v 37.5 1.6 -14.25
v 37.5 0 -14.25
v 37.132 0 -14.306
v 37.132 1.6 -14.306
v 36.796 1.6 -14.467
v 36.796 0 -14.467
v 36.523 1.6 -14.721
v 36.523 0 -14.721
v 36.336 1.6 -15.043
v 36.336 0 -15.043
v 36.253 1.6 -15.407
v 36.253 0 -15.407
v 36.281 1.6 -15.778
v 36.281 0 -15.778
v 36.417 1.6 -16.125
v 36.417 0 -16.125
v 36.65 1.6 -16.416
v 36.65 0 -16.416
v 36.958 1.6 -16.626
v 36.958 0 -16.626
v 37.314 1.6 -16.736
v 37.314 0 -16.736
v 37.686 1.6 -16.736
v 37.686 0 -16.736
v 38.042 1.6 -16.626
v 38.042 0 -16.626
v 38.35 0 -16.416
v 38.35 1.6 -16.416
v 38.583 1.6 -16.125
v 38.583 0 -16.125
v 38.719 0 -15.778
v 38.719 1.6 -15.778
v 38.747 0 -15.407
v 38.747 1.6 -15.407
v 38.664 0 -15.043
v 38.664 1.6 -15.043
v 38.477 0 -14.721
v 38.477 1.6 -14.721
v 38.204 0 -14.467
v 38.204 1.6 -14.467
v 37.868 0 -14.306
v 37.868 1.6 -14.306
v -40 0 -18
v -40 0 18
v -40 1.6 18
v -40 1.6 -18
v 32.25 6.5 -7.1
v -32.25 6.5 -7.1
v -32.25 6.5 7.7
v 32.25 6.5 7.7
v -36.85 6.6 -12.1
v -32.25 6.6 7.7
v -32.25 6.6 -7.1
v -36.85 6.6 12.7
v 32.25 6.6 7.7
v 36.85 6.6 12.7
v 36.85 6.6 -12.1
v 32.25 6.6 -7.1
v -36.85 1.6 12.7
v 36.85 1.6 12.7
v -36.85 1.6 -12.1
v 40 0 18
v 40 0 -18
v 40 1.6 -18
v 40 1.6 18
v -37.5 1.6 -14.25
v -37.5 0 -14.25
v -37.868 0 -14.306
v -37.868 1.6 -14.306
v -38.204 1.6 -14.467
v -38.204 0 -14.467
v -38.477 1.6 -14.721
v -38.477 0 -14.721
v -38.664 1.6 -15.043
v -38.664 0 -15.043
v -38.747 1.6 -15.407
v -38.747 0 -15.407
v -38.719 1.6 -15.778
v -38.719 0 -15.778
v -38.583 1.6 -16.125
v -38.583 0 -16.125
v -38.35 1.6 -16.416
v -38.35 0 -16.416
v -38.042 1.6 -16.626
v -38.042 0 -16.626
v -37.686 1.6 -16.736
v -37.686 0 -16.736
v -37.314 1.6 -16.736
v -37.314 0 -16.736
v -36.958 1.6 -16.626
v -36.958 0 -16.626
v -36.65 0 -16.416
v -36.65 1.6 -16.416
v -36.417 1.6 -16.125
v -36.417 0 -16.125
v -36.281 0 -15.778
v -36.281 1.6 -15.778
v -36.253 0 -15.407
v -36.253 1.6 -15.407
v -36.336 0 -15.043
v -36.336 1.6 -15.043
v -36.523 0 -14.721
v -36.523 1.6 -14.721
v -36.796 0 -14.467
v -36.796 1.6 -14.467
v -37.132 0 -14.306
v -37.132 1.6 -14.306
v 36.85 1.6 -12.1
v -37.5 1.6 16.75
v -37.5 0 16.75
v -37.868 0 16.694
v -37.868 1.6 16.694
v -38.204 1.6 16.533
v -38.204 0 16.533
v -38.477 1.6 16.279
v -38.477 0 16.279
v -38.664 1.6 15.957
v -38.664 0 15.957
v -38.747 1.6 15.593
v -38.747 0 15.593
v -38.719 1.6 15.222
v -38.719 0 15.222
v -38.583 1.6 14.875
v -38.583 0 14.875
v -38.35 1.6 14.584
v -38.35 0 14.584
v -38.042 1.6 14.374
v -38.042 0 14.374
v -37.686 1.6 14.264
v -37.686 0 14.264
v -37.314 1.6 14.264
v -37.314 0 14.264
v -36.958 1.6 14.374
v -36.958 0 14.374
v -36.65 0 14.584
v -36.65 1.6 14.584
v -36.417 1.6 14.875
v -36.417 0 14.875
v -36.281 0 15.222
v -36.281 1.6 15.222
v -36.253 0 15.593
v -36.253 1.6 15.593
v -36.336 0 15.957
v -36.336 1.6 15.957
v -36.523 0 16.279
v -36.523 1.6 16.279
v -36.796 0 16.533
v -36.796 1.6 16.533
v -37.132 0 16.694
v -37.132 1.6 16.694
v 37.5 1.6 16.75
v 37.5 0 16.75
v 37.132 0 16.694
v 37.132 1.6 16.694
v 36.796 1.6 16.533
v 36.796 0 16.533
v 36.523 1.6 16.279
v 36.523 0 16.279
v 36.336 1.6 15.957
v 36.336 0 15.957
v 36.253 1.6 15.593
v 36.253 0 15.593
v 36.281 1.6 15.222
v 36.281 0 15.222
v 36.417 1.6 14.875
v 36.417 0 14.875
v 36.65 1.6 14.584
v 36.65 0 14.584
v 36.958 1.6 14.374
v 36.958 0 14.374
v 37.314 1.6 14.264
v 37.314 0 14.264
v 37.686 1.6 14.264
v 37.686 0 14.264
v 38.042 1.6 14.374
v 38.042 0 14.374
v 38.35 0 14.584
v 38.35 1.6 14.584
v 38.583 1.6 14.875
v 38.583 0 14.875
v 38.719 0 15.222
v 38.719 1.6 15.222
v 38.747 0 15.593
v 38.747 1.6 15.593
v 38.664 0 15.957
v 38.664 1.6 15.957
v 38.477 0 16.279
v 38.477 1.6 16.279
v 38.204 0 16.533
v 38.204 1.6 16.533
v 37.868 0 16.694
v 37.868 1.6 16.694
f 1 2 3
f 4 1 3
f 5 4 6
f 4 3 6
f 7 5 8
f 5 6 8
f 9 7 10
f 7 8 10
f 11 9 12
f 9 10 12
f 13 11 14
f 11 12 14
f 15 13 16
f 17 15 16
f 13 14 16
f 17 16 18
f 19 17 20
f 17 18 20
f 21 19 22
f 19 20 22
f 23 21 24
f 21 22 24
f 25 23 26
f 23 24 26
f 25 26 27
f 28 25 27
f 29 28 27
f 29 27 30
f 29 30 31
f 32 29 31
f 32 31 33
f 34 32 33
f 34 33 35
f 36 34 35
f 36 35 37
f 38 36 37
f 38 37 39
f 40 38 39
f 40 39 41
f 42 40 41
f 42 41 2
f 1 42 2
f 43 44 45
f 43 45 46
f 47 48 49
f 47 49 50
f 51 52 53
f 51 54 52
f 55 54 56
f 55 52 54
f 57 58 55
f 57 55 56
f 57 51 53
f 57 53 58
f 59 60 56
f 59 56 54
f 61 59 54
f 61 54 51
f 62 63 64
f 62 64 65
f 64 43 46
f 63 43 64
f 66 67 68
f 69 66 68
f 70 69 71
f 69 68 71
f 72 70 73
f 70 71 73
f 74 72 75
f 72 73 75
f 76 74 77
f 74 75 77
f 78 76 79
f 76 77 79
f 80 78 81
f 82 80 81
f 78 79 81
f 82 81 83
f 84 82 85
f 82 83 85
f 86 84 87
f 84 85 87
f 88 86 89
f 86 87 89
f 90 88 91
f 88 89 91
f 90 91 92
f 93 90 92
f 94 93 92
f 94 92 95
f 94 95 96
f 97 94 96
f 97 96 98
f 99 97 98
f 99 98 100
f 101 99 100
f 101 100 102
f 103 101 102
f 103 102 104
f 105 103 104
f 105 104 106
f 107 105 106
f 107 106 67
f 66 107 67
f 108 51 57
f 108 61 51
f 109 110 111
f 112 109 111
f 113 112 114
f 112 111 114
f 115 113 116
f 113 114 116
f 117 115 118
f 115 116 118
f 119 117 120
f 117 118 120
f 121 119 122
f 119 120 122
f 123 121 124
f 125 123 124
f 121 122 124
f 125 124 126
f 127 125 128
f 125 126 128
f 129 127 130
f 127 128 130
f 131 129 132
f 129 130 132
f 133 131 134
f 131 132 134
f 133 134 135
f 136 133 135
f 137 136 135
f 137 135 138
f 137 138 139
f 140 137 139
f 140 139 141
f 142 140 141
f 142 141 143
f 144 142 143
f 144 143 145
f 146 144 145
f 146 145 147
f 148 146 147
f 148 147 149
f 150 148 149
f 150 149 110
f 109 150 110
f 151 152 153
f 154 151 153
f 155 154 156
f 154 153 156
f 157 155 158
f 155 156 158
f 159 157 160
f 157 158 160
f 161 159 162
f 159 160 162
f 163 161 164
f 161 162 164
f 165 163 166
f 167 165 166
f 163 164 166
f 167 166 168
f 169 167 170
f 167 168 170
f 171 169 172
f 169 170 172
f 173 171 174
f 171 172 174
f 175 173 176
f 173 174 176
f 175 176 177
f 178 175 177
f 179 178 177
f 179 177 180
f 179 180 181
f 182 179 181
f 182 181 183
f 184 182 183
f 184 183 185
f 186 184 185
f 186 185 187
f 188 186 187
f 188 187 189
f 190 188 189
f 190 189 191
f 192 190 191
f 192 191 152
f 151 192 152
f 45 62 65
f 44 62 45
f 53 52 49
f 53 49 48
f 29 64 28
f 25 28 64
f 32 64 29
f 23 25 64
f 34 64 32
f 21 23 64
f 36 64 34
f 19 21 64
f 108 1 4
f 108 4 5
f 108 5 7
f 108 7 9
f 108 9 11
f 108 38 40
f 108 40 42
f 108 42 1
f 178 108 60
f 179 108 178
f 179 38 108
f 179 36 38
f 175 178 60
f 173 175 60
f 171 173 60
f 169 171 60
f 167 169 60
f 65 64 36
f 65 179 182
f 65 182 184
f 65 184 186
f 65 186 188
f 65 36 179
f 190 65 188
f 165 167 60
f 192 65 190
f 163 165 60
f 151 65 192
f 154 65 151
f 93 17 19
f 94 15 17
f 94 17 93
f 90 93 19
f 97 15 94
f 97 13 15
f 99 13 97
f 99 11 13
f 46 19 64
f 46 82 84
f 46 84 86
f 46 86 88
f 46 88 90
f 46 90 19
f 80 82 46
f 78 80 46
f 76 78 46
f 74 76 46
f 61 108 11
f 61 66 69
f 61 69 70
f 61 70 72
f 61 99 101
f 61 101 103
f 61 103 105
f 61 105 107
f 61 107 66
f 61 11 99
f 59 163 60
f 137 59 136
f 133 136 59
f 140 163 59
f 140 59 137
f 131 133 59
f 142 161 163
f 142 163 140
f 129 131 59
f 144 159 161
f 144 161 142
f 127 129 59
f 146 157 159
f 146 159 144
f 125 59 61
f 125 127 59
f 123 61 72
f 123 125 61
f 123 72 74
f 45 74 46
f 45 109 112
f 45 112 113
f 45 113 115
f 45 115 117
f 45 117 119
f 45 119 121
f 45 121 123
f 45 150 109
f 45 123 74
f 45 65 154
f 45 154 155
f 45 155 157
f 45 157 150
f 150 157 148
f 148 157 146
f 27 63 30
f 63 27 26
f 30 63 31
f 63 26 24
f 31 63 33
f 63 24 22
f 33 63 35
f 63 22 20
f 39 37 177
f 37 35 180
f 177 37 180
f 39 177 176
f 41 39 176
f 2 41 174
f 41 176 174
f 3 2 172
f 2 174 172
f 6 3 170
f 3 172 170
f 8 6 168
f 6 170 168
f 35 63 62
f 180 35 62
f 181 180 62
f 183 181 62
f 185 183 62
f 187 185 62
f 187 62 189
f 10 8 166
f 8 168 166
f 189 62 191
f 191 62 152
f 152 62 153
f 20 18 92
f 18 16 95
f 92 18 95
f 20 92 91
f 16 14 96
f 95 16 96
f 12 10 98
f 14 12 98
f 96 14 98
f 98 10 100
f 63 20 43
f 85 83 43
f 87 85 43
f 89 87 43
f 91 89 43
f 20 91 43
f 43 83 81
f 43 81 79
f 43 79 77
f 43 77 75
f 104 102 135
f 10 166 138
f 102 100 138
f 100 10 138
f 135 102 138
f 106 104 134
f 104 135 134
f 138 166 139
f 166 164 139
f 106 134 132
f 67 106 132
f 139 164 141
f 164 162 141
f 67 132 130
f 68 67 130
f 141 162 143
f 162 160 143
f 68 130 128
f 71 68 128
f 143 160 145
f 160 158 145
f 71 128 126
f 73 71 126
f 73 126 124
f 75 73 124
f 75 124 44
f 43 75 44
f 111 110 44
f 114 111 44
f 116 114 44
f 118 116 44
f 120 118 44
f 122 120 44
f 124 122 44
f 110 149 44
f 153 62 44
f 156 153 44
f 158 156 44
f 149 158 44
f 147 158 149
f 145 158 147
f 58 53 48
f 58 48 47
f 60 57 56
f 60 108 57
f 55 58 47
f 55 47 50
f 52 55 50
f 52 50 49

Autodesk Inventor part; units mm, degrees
ref_plane "YZ Plane" through (0, 0, 0) normal (1, 0, 0) x (0, 1, 0)
ref_plane "XZ Plane" through (0, 0, 0) normal (0, 1, 0) x (-1, 0, 0)
ref_plane "XY Plane" through (0, 0, 0) normal (0, 0, 1) x (1, 0, 0)
sketch "Sketch1" plane through (0, 0, 0) normal (0, 1, 0) x (-1, 0, 0)
  line L0 (-40, 18) -> (40, 18)
  line L1 (40, 18) -> (40, -18)
  line L2 (40, -18) -> (-40, -18)
  line L3 (-40, -18) -> (-40, 18)
  line L4 (-40, 18) -> (40, -18) construction
  line L5 (40, 18) -> (-40, -18) construction
  point P0 (0, 0)
  dimension "d0" = 80
  dimension "d1" = 36
extrude "Extrusion1" add sketch "Sketch1" along normal blind 1.6
sketch "Sketch2" plane through (0, 1.6, 0) normal (0, 1, 0) x (1, 0, 0)
  line L0 (-40, -18) -> (40, -18) construction
  line L1 (40, -18) -> (40, 18) construction
  line L2 (40, 18) -> (-40, 18) construction
  line L3 (-40, 18) -> (-40, -18) construction
  point P0 (0, 0)
  point P1 (-37.5, 15.5)
  point P2 (37.5, 15.5)
  point P3 (-37.5, -15.5)
  point P4 (37.5, -15.5)
  dimension "d4" = 75
  dimension "d5" = 31
  dimension "d6" = 2.5
  dimension "d7" = 2.5
hole "Hole1" at (-37.5, 1.6, -15.5) at (37.5, 1.6, -15.5) at (-37.5, 1.6, 15.5) at (37.5, 1.6, 15.5) direction (0, -1, 0) diameter 2.5 end through all
sketch "Sketch3" plane through (0, 1.6, 0) normal (0, 1, 0) x (1, 0, 0)
  line L0 (36.85, -12.7) -> (-36.85, -12.7)
  line L1 (-36.85, -12.7) -> (-36.85, 12.1)
  line L2 (-36.85, 12.1) -> (36.85, 12.1)
  line L3 (36.85, 12.1) -> (36.85, -12.7)
  line L4 (36.85, -12.7) -> (-36.85, 12.1) construction
  line L5 (-36.85, -12.7) -> (36.85, 12.1) construction
  circle A0 centre (-37.5, -15.5) radius 1.25 construction
  circle A1 centre (-37.5, 15.5) radius 1.25 construction
  circle A2 centre (37.5, 15.5) radius 1.25 construction
  circle A3 centre (37.5, -15.5) radius 1.25 construction
  line L6 (-40, -18) -> (40, -18) construction
  line L7 (40, -18) -> (40, 18) construction
  line L8 (40, 18) -> (-40, 18) construction
  line L9 (-40, 18) -> (-40, -18) construction
  point P0 (0, 0)
  point P1 (0, -0.3)
  dimension "d15" = 73.7
  dimension "d16" = 24.8
  dimension "d17" = 5.9
  dimension "d18" = 3.15
extrude "Extrusion2" add sketch "Sketch3" along normal blind 5
sketch "Sketch4" plane through (0, 6.6, 0) normal (0, 1, 0) x (1, 0, 0)
  line L0 (32.25, -7.7) -> (-32.25, -7.7)
  line L1 (-32.25, -7.7) -> (-32.25, 7.1)
  line L2 (-32.25, 7.1) -> (32.25, 7.1)
  line L3 (32.25, 7.1) -> (32.25, -7.7)
  line L4 (32.25, -7.7) -> (-32.25, 7.1) construction
  line L5 (-32.25, -7.7) -> (32.25, 7.1) construction
  line L6 (-36.85, -12.7) -> (-36.85, 12.1) construction
  line L7 (-36.85, 12.1) -> (36.85, 12.1) construction
  line L8 (36.85, 12.1) -> (36.85, -12.7) construction
  line L9 (36.85, -12.7) -> (-36.85, -12.7) construction
  circle A0 centre (-37.5, -15.5) radius 1.25 construction
  circle A1 centre (-37.5, 15.5) radius 1.25 construction
  circle A2 centre (37.5, 15.5) radius 1.25 construction
  circle A3 centre (37.5, -15.5) radius 1.25 construction
  line L10 (-40, -18) -> (40, -18) construction
  line L11 (40, -18) -> (40, 18) construction
  line L12 (40, 18) -> (-40, 18) construction
  line L13 (-40, 18) -> (-40, -18) construction
  point P0 (0, 0)
  point P1 (0, -0.3)
  dimension "d21" = 64.5
  dimension "d22" = 14.8
  dimension "d23" = 10.9
  dimension "d24" = 7.75
extrude "Extrusion3" cut sketch "Sketch4" against normal blind 0.1
sketch "Sketch5" plane through (0, 6.5, 0) normal (0, 1, 0) x (1, 0, 0)
  line L0 (-28.1, 5.45) -> (28.1, 5.45) construction
  line L1 (28.1, 5.45) -> (28.1, -6.05) construction
  line L2 (28.1, -6.05) -> (-28.1, -6.05) construction
  line L3 (-28.1, -6.05) -> (-28.1, 5.45) construction
  line L4 (32.25, -7.7) -> (-32.25, -7.7) construction
  line L5 (32.25, 7.1) -> (32.25, -7.7) construction
  line L6 (-32.25, 7.1) -> (32.25, 7.1) construction
  line L7 (-32.25, -7.7) -> (-32.25, 7.1) construction
  line L8 (-36.85, -12.7) -> (-36.85, 12.1) construction
  line L9 (-36.85, 12.1) -> (36.85, 12.1) construction
  line L10 (36.85, 12.1) -> (36.85, -12.7) construction
  line L11 (36.85, -12.7) -> (-36.85, -12.7) construction
  circle A0 centre (-37.5, -15.5) radius 1.25 construction
  circle A1 centre (-37.5, 15.5) radius 1.25 construction
  circle A2 centre (37.5, 15.5) radius 1.25 construction
  circle A3 centre (37.5, -15.5) radius 1.25 construction
  line L12 (-40, -18) -> (40, -18) construction
  line L13 (40, -18) -> (40, 18) construction
  line L14 (40, 18) -> (-40, 18) construction
  line L15 (-40, 18) -> (-40, -18) construction
  line L16 (32.25, 7.1) -> (32.25, -7.7) construction
  line L17 (32.25, -7.7) -> (-32.25, -7.7) construction
  line L18 (-32.25, -7.7) -> (-32.25, 7.1) construction
  line L19 (-32.25, 7.1) -> (32.25, 7.1) construction
  line L20 (-36.85, -12.7) -> (36.85, -12.7) construction
  line L21 (36.85, -12.7) -> (36.85, 12.1) construction
  line L22 (36.85, 12.1) -> (-36.85, 12.1) construction
  line L23 (-36.85, 12.1) -> (-36.85, -12.7) construction
  point P0 (0, 0)
  dimension "d27" = 56.2
  dimension "d28" = 11.5
  dimension "d29" = 12.55
  dimension "d30" = 11.9
properties part number "LCD Display"
